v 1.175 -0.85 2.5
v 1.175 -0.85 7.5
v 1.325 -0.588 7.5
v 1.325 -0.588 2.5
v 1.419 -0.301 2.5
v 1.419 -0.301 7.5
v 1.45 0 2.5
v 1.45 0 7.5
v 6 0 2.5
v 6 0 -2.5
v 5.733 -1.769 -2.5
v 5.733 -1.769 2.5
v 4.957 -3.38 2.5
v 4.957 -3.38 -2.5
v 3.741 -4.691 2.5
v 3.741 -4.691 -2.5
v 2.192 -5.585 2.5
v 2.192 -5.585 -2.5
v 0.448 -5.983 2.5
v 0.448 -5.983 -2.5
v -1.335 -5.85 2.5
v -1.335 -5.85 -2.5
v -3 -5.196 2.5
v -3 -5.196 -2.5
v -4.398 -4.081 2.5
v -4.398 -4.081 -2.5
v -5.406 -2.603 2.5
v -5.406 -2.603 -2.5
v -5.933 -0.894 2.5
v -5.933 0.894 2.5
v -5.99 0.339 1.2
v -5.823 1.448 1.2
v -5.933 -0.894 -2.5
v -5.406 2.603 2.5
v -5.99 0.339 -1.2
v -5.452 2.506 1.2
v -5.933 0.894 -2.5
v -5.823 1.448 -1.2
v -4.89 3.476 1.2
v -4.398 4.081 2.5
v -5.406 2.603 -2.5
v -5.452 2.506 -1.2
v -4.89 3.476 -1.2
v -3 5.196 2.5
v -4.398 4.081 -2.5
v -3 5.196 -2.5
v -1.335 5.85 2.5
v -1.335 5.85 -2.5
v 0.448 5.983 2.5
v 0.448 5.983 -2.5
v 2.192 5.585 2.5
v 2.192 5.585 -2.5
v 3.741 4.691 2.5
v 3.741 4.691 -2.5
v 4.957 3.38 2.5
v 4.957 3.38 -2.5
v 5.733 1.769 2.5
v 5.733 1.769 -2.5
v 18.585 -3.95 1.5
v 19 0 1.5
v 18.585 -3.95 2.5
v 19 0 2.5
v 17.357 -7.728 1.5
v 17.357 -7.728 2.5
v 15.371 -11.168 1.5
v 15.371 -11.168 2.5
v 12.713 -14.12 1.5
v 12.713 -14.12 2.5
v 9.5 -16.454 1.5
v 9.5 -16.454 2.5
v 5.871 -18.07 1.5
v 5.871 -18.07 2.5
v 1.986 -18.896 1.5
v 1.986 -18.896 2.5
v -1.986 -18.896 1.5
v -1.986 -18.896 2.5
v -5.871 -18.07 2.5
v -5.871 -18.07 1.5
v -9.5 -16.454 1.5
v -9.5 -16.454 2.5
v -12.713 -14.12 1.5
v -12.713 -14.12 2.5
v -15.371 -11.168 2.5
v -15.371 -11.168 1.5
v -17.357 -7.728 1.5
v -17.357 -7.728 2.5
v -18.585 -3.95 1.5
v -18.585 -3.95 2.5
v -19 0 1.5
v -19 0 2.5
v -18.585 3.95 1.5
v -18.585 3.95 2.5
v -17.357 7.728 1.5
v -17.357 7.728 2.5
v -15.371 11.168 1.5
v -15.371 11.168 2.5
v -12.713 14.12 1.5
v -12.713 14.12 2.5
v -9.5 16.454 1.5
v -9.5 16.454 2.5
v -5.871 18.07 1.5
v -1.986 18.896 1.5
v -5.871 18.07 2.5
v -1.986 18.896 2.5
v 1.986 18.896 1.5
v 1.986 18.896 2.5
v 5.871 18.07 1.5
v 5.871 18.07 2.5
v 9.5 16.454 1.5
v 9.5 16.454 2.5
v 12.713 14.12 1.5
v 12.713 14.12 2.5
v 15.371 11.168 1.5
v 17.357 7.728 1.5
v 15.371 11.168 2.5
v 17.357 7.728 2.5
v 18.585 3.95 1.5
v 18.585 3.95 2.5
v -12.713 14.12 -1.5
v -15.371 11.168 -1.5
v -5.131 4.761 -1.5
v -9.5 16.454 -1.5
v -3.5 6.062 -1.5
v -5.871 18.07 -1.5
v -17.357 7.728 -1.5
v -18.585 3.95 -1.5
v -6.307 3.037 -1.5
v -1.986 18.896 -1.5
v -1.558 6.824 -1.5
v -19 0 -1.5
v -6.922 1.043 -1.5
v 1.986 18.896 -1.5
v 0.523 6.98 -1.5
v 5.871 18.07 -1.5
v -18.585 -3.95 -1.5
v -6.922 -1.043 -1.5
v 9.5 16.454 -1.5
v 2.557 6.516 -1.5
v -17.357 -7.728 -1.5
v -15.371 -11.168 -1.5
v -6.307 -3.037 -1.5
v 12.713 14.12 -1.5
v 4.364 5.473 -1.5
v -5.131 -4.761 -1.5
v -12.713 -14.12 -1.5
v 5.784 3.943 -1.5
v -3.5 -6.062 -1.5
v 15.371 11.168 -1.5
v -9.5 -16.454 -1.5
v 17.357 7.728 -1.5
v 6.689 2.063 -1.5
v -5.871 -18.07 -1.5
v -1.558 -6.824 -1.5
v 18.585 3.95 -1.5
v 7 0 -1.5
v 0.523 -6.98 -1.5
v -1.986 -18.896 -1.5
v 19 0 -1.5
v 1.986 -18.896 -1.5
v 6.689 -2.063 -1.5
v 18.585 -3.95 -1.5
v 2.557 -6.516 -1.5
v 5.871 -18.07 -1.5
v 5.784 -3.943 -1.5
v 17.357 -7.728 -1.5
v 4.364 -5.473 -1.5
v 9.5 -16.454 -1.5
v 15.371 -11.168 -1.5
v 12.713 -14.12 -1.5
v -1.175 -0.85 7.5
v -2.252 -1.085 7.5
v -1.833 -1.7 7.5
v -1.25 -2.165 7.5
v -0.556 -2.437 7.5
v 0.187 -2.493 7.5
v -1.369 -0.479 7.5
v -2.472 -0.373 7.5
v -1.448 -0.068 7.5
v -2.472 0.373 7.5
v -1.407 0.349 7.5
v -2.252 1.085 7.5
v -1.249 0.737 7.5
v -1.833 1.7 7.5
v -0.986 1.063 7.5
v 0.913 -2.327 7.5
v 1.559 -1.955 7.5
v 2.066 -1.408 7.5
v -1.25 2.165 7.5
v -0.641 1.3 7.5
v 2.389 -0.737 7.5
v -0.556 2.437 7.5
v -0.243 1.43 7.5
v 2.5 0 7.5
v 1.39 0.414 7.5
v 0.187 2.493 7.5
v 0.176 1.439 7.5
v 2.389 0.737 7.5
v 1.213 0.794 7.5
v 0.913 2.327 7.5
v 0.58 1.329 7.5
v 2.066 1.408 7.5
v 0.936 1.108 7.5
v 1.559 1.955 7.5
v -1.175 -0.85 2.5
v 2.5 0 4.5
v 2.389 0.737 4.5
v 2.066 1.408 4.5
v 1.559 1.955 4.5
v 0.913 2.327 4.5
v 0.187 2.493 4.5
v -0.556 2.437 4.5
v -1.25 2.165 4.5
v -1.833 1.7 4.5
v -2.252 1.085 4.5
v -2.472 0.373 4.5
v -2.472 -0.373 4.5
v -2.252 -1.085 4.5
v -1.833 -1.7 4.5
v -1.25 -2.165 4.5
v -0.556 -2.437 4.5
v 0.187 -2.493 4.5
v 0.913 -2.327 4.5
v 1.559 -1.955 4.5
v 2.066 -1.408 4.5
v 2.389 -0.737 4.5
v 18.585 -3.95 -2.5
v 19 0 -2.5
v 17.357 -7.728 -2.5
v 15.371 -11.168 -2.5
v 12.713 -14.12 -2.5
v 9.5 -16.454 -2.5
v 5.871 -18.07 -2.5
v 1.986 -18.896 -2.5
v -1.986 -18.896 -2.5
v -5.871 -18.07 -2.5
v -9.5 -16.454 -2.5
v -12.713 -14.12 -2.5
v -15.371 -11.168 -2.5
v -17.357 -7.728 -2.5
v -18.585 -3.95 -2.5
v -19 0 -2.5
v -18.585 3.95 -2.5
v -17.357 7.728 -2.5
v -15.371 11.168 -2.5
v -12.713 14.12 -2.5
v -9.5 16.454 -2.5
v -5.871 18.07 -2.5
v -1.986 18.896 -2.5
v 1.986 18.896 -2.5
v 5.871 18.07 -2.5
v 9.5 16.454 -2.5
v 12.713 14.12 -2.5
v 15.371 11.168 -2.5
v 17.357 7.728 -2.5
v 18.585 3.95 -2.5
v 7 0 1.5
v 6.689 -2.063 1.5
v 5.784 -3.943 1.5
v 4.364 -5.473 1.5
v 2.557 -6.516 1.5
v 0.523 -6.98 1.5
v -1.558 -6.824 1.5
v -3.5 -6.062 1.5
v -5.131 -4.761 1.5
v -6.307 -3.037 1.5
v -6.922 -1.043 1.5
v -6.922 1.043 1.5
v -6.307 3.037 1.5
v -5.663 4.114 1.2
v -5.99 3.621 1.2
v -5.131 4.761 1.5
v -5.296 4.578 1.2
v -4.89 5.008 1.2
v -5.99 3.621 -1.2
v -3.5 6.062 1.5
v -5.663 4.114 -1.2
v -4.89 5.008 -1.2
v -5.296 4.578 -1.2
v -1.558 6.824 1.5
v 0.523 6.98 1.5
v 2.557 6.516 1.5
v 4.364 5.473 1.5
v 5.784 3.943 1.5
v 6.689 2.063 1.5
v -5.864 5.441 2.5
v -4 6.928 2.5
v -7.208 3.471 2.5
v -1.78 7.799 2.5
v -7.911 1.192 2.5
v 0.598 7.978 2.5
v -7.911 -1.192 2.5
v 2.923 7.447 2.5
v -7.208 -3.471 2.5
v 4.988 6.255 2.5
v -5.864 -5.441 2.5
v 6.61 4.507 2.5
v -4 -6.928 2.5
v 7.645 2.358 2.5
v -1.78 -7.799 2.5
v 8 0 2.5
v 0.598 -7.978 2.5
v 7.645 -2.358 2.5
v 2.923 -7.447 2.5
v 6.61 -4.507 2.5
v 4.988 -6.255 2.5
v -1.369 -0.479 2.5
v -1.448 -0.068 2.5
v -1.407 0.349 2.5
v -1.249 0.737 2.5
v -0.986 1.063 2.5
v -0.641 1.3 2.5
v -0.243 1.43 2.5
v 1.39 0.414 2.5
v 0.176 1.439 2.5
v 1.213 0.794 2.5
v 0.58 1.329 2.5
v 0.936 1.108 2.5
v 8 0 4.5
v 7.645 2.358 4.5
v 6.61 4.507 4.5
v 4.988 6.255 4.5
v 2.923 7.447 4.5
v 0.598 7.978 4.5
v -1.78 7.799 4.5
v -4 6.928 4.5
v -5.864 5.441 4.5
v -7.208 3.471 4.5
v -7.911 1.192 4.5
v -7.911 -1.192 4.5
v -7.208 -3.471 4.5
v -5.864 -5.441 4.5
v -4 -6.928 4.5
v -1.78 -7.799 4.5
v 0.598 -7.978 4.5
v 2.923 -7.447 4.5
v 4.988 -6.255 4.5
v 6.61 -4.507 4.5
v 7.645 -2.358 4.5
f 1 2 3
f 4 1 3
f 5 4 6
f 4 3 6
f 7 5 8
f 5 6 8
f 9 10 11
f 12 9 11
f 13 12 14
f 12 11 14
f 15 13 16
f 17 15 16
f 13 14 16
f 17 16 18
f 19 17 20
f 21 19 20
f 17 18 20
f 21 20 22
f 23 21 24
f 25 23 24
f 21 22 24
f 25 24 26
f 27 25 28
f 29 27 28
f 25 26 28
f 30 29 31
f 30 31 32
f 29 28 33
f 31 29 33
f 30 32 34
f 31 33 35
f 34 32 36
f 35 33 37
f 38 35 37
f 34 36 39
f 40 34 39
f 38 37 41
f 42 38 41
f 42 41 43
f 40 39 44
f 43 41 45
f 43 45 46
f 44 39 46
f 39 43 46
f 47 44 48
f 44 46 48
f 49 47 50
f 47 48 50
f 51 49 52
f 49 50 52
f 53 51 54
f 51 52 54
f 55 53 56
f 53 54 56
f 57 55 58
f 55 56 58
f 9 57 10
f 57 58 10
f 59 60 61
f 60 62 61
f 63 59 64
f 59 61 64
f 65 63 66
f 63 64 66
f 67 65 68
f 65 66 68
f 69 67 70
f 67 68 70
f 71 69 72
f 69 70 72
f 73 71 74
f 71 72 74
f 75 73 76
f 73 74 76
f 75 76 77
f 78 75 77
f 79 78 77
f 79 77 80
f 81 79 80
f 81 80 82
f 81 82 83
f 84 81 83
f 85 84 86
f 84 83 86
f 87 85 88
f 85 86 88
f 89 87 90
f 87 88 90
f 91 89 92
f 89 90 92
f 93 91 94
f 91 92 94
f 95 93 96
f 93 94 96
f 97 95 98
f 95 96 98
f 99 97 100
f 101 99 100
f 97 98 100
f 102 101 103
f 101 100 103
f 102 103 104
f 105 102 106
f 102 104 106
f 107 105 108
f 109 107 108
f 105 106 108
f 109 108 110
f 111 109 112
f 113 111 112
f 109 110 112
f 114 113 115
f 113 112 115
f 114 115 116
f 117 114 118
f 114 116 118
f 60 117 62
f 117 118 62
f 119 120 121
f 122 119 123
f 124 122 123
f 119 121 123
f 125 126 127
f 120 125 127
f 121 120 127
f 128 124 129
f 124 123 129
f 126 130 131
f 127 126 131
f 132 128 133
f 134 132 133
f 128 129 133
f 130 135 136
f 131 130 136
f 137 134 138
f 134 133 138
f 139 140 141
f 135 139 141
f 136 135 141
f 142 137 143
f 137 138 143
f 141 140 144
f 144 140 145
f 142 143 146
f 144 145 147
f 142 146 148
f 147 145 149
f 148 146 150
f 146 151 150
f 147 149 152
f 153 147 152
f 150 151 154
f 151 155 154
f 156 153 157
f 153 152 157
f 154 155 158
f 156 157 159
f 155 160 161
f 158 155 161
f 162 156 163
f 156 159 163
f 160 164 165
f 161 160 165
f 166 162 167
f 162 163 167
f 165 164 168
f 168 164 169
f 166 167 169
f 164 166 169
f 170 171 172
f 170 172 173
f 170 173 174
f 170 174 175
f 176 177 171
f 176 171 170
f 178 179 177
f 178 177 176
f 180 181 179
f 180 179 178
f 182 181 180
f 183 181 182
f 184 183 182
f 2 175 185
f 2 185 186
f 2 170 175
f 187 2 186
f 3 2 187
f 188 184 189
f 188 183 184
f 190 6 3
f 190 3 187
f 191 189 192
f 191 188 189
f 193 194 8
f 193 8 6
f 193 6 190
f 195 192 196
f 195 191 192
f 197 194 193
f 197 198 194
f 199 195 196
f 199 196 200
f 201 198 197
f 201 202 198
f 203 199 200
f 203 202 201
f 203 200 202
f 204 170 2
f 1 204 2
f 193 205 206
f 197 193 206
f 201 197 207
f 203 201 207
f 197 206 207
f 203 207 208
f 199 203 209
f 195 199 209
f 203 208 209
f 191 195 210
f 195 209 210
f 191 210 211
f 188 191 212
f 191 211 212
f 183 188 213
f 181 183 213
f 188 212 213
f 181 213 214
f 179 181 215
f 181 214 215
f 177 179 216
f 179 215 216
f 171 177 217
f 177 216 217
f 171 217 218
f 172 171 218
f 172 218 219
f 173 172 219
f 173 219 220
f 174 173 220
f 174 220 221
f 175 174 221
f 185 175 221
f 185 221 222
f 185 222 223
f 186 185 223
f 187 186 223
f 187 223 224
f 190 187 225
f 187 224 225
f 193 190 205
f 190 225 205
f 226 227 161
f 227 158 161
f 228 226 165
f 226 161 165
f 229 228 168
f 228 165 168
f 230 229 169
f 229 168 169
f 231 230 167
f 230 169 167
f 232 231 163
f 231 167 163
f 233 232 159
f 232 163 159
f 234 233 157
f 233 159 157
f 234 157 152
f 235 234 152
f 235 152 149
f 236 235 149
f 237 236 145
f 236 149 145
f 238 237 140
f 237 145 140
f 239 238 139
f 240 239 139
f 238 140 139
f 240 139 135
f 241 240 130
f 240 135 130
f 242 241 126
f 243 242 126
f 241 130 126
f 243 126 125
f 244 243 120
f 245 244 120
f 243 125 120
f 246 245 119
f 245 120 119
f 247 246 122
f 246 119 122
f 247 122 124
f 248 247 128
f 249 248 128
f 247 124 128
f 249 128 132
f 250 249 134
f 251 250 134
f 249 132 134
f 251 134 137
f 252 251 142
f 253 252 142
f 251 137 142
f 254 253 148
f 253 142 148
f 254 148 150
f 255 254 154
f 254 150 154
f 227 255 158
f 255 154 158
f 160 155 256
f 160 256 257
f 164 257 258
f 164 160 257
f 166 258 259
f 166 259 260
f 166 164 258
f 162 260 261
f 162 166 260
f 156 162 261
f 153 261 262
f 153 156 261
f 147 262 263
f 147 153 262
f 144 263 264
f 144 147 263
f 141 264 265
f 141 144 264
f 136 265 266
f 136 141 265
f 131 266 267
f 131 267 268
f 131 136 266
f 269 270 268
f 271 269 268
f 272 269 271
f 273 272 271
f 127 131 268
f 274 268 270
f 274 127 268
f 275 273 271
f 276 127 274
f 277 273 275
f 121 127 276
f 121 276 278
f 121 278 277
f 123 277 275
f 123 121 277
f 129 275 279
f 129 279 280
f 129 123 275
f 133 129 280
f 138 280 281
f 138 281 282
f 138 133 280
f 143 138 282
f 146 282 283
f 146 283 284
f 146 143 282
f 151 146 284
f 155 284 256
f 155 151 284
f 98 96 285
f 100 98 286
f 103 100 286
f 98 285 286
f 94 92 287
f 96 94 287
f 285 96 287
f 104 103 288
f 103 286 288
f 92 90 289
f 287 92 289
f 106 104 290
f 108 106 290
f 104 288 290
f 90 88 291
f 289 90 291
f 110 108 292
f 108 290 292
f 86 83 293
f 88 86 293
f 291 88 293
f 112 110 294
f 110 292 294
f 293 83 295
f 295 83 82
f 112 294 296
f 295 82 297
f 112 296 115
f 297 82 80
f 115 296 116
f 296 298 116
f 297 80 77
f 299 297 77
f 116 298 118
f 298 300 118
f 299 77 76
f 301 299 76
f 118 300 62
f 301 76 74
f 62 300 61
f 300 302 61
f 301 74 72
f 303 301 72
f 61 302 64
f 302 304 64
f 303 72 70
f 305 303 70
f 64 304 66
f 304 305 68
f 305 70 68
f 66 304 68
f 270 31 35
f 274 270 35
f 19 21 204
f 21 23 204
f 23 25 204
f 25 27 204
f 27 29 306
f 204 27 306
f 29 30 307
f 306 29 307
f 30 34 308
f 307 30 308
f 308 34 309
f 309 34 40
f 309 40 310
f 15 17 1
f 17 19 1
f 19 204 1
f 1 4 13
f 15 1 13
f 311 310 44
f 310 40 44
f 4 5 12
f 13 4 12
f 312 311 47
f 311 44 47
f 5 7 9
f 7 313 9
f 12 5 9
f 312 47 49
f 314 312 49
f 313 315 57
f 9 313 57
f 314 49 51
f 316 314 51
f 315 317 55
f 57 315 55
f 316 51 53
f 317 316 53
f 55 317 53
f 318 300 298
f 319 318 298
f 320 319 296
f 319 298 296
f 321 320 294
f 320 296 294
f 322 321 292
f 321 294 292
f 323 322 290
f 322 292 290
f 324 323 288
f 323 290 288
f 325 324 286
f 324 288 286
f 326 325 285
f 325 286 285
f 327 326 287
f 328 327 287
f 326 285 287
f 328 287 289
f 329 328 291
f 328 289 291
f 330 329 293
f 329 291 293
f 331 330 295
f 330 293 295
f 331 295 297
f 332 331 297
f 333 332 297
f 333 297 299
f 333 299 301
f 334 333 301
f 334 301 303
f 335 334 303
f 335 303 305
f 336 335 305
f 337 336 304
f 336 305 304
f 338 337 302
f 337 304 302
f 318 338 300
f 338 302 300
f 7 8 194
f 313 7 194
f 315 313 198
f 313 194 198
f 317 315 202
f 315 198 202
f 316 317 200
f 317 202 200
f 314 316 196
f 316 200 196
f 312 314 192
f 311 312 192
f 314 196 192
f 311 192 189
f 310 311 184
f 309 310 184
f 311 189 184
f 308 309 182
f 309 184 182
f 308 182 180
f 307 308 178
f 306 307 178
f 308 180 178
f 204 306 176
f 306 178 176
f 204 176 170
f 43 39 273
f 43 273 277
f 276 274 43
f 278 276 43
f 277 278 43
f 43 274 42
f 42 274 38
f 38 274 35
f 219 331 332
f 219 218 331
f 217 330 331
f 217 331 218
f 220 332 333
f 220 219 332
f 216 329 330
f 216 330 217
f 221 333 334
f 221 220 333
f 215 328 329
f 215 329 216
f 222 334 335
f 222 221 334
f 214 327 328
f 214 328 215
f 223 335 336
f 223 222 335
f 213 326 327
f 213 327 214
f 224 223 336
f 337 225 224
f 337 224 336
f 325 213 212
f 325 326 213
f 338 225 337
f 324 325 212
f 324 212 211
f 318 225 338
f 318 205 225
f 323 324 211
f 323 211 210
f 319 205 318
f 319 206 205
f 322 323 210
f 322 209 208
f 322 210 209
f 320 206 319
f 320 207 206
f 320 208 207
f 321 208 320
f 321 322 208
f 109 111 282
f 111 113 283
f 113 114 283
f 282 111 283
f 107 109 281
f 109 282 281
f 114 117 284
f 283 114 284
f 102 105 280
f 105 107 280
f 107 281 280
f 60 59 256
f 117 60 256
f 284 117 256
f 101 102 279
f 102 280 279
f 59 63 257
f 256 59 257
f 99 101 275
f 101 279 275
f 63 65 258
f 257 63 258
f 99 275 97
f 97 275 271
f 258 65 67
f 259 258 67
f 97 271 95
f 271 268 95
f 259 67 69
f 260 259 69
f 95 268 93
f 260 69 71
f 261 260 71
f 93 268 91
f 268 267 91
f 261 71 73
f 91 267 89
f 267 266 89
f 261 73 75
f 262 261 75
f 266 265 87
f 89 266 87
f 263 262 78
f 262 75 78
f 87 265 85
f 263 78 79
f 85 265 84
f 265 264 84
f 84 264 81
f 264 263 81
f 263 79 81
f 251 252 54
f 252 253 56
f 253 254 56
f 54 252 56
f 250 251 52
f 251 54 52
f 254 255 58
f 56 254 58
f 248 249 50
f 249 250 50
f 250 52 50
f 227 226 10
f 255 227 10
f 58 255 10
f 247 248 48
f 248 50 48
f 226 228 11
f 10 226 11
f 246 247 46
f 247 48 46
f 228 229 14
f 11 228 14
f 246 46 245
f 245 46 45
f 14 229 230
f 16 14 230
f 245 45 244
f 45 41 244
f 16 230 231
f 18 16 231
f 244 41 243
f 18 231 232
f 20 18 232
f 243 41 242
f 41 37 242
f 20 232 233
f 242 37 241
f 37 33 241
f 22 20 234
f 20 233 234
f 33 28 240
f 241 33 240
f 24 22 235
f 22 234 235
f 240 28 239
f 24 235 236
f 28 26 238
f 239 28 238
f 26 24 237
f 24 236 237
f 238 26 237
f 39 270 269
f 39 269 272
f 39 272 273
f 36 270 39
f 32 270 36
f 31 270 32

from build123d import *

# Parameters (mm, degrees)
SKETCH_1_W            = 3
SKETCH_1_H            = 1
CUT_EXTRUDE_START     = 0.339415
SKETCH_3_W            = 1.1
SKETCH_3_H            = 2.4
CUT_EXTRUDE_899_DEPTH = 4.668984
SKETCH_4_R            = 8
EXTRUDE_1_DEPTH       = 2
SKETCH_5_R            = 2.5
EXTRUDE_2_DEPTH       = 3
CUT_EXTRUDE_2_REACH   = 30.671


with BuildPart() as part:
    # 草图1 → Revolve 702 (revolve)
    with BuildSketch(Plane(origin=(0, 0, 0), x_dir=(0, 0, -1), z_dir=(1, 0, 0)), mode=Mode.PRIVATE) as revolve_702_sk:
        Polygon((1.5, 7), (1.5, 6), (2.5, 6), (2.5, 19), (1.5, 19), align=None)
        with Locations((0, 6.5)):
            Rectangle(SKETCH_1_W, SKETCH_1_H)
        Polygon((-2.5, 6), (-1.5, 6), (-1.5, 7), (-1.5, 19), (-2.5, 19), align=None)
    revolve(revolve_702_sk.sketch.rotate(Axis((0, 0, 1.65), (0, 0, -1)), 90), axis=Axis((0, 0, 1.65), (0, 0, -1)))

    # 草图3 → Cut-Extrude 899 (cut)
    with BuildSketch(Plane(origin=(0, 0, 0), x_dir=(1, 0, 0), z_dir=(0, 1, 0)).offset(CUT_EXTRUDE_START)):
        with Locations((-5.440392091, 0)):
            Rectangle(SKETCH_3_W, SKETCH_3_H)
    extrude(amount=CUT_EXTRUDE_899_DEPTH, mode=Mode.SUBTRACT)

    # 草图4 → 凸台-拉伸1 (add)
    with BuildSketch(Plane.XY.offset(2.5)):
        Circle(SKETCH_4_R)
    extrude(amount=EXTRUDE_1_DEPTH)

    # 草图5 → 凸台-拉伸2 (add)
    with BuildSketch(Plane.XY.offset(4.5)):
        Circle(SKETCH_5_R)
    extrude(amount=EXTRUDE_2_DEPTH)

    # 草图6 → 切除-拉伸2 (cut, up to next)
    with BuildSketch(Plane.XY.offset(7.5), mode=Mode.PRIVATE) as cut_extrude_2_sk1:
        with BuildLine():
            Line((-1.174734012, -0.85), (1.174734012, -0.85))
            ThreePointArc((1.174734012, -0.85), (1.379468071, -0.446730166), (1.45, 0))
            ThreePointArc((1.45, 0), (-0.446730166, 1.379468071), (-1.174734012, -0.85))
        make_face()
    cut_extrude_2_tool1 = extrude(cut_extrude_2_sk1.sketch, amount=-CUT_EXTRUDE_2_REACH, mode=Mode.PRIVATE) & part.part
    add(cut_extrude_2_tool1.solids().sort_by_distance((0, 0.192371, 7.5))[0], mode=Mode.SUBTRACT)


solid = part.part
